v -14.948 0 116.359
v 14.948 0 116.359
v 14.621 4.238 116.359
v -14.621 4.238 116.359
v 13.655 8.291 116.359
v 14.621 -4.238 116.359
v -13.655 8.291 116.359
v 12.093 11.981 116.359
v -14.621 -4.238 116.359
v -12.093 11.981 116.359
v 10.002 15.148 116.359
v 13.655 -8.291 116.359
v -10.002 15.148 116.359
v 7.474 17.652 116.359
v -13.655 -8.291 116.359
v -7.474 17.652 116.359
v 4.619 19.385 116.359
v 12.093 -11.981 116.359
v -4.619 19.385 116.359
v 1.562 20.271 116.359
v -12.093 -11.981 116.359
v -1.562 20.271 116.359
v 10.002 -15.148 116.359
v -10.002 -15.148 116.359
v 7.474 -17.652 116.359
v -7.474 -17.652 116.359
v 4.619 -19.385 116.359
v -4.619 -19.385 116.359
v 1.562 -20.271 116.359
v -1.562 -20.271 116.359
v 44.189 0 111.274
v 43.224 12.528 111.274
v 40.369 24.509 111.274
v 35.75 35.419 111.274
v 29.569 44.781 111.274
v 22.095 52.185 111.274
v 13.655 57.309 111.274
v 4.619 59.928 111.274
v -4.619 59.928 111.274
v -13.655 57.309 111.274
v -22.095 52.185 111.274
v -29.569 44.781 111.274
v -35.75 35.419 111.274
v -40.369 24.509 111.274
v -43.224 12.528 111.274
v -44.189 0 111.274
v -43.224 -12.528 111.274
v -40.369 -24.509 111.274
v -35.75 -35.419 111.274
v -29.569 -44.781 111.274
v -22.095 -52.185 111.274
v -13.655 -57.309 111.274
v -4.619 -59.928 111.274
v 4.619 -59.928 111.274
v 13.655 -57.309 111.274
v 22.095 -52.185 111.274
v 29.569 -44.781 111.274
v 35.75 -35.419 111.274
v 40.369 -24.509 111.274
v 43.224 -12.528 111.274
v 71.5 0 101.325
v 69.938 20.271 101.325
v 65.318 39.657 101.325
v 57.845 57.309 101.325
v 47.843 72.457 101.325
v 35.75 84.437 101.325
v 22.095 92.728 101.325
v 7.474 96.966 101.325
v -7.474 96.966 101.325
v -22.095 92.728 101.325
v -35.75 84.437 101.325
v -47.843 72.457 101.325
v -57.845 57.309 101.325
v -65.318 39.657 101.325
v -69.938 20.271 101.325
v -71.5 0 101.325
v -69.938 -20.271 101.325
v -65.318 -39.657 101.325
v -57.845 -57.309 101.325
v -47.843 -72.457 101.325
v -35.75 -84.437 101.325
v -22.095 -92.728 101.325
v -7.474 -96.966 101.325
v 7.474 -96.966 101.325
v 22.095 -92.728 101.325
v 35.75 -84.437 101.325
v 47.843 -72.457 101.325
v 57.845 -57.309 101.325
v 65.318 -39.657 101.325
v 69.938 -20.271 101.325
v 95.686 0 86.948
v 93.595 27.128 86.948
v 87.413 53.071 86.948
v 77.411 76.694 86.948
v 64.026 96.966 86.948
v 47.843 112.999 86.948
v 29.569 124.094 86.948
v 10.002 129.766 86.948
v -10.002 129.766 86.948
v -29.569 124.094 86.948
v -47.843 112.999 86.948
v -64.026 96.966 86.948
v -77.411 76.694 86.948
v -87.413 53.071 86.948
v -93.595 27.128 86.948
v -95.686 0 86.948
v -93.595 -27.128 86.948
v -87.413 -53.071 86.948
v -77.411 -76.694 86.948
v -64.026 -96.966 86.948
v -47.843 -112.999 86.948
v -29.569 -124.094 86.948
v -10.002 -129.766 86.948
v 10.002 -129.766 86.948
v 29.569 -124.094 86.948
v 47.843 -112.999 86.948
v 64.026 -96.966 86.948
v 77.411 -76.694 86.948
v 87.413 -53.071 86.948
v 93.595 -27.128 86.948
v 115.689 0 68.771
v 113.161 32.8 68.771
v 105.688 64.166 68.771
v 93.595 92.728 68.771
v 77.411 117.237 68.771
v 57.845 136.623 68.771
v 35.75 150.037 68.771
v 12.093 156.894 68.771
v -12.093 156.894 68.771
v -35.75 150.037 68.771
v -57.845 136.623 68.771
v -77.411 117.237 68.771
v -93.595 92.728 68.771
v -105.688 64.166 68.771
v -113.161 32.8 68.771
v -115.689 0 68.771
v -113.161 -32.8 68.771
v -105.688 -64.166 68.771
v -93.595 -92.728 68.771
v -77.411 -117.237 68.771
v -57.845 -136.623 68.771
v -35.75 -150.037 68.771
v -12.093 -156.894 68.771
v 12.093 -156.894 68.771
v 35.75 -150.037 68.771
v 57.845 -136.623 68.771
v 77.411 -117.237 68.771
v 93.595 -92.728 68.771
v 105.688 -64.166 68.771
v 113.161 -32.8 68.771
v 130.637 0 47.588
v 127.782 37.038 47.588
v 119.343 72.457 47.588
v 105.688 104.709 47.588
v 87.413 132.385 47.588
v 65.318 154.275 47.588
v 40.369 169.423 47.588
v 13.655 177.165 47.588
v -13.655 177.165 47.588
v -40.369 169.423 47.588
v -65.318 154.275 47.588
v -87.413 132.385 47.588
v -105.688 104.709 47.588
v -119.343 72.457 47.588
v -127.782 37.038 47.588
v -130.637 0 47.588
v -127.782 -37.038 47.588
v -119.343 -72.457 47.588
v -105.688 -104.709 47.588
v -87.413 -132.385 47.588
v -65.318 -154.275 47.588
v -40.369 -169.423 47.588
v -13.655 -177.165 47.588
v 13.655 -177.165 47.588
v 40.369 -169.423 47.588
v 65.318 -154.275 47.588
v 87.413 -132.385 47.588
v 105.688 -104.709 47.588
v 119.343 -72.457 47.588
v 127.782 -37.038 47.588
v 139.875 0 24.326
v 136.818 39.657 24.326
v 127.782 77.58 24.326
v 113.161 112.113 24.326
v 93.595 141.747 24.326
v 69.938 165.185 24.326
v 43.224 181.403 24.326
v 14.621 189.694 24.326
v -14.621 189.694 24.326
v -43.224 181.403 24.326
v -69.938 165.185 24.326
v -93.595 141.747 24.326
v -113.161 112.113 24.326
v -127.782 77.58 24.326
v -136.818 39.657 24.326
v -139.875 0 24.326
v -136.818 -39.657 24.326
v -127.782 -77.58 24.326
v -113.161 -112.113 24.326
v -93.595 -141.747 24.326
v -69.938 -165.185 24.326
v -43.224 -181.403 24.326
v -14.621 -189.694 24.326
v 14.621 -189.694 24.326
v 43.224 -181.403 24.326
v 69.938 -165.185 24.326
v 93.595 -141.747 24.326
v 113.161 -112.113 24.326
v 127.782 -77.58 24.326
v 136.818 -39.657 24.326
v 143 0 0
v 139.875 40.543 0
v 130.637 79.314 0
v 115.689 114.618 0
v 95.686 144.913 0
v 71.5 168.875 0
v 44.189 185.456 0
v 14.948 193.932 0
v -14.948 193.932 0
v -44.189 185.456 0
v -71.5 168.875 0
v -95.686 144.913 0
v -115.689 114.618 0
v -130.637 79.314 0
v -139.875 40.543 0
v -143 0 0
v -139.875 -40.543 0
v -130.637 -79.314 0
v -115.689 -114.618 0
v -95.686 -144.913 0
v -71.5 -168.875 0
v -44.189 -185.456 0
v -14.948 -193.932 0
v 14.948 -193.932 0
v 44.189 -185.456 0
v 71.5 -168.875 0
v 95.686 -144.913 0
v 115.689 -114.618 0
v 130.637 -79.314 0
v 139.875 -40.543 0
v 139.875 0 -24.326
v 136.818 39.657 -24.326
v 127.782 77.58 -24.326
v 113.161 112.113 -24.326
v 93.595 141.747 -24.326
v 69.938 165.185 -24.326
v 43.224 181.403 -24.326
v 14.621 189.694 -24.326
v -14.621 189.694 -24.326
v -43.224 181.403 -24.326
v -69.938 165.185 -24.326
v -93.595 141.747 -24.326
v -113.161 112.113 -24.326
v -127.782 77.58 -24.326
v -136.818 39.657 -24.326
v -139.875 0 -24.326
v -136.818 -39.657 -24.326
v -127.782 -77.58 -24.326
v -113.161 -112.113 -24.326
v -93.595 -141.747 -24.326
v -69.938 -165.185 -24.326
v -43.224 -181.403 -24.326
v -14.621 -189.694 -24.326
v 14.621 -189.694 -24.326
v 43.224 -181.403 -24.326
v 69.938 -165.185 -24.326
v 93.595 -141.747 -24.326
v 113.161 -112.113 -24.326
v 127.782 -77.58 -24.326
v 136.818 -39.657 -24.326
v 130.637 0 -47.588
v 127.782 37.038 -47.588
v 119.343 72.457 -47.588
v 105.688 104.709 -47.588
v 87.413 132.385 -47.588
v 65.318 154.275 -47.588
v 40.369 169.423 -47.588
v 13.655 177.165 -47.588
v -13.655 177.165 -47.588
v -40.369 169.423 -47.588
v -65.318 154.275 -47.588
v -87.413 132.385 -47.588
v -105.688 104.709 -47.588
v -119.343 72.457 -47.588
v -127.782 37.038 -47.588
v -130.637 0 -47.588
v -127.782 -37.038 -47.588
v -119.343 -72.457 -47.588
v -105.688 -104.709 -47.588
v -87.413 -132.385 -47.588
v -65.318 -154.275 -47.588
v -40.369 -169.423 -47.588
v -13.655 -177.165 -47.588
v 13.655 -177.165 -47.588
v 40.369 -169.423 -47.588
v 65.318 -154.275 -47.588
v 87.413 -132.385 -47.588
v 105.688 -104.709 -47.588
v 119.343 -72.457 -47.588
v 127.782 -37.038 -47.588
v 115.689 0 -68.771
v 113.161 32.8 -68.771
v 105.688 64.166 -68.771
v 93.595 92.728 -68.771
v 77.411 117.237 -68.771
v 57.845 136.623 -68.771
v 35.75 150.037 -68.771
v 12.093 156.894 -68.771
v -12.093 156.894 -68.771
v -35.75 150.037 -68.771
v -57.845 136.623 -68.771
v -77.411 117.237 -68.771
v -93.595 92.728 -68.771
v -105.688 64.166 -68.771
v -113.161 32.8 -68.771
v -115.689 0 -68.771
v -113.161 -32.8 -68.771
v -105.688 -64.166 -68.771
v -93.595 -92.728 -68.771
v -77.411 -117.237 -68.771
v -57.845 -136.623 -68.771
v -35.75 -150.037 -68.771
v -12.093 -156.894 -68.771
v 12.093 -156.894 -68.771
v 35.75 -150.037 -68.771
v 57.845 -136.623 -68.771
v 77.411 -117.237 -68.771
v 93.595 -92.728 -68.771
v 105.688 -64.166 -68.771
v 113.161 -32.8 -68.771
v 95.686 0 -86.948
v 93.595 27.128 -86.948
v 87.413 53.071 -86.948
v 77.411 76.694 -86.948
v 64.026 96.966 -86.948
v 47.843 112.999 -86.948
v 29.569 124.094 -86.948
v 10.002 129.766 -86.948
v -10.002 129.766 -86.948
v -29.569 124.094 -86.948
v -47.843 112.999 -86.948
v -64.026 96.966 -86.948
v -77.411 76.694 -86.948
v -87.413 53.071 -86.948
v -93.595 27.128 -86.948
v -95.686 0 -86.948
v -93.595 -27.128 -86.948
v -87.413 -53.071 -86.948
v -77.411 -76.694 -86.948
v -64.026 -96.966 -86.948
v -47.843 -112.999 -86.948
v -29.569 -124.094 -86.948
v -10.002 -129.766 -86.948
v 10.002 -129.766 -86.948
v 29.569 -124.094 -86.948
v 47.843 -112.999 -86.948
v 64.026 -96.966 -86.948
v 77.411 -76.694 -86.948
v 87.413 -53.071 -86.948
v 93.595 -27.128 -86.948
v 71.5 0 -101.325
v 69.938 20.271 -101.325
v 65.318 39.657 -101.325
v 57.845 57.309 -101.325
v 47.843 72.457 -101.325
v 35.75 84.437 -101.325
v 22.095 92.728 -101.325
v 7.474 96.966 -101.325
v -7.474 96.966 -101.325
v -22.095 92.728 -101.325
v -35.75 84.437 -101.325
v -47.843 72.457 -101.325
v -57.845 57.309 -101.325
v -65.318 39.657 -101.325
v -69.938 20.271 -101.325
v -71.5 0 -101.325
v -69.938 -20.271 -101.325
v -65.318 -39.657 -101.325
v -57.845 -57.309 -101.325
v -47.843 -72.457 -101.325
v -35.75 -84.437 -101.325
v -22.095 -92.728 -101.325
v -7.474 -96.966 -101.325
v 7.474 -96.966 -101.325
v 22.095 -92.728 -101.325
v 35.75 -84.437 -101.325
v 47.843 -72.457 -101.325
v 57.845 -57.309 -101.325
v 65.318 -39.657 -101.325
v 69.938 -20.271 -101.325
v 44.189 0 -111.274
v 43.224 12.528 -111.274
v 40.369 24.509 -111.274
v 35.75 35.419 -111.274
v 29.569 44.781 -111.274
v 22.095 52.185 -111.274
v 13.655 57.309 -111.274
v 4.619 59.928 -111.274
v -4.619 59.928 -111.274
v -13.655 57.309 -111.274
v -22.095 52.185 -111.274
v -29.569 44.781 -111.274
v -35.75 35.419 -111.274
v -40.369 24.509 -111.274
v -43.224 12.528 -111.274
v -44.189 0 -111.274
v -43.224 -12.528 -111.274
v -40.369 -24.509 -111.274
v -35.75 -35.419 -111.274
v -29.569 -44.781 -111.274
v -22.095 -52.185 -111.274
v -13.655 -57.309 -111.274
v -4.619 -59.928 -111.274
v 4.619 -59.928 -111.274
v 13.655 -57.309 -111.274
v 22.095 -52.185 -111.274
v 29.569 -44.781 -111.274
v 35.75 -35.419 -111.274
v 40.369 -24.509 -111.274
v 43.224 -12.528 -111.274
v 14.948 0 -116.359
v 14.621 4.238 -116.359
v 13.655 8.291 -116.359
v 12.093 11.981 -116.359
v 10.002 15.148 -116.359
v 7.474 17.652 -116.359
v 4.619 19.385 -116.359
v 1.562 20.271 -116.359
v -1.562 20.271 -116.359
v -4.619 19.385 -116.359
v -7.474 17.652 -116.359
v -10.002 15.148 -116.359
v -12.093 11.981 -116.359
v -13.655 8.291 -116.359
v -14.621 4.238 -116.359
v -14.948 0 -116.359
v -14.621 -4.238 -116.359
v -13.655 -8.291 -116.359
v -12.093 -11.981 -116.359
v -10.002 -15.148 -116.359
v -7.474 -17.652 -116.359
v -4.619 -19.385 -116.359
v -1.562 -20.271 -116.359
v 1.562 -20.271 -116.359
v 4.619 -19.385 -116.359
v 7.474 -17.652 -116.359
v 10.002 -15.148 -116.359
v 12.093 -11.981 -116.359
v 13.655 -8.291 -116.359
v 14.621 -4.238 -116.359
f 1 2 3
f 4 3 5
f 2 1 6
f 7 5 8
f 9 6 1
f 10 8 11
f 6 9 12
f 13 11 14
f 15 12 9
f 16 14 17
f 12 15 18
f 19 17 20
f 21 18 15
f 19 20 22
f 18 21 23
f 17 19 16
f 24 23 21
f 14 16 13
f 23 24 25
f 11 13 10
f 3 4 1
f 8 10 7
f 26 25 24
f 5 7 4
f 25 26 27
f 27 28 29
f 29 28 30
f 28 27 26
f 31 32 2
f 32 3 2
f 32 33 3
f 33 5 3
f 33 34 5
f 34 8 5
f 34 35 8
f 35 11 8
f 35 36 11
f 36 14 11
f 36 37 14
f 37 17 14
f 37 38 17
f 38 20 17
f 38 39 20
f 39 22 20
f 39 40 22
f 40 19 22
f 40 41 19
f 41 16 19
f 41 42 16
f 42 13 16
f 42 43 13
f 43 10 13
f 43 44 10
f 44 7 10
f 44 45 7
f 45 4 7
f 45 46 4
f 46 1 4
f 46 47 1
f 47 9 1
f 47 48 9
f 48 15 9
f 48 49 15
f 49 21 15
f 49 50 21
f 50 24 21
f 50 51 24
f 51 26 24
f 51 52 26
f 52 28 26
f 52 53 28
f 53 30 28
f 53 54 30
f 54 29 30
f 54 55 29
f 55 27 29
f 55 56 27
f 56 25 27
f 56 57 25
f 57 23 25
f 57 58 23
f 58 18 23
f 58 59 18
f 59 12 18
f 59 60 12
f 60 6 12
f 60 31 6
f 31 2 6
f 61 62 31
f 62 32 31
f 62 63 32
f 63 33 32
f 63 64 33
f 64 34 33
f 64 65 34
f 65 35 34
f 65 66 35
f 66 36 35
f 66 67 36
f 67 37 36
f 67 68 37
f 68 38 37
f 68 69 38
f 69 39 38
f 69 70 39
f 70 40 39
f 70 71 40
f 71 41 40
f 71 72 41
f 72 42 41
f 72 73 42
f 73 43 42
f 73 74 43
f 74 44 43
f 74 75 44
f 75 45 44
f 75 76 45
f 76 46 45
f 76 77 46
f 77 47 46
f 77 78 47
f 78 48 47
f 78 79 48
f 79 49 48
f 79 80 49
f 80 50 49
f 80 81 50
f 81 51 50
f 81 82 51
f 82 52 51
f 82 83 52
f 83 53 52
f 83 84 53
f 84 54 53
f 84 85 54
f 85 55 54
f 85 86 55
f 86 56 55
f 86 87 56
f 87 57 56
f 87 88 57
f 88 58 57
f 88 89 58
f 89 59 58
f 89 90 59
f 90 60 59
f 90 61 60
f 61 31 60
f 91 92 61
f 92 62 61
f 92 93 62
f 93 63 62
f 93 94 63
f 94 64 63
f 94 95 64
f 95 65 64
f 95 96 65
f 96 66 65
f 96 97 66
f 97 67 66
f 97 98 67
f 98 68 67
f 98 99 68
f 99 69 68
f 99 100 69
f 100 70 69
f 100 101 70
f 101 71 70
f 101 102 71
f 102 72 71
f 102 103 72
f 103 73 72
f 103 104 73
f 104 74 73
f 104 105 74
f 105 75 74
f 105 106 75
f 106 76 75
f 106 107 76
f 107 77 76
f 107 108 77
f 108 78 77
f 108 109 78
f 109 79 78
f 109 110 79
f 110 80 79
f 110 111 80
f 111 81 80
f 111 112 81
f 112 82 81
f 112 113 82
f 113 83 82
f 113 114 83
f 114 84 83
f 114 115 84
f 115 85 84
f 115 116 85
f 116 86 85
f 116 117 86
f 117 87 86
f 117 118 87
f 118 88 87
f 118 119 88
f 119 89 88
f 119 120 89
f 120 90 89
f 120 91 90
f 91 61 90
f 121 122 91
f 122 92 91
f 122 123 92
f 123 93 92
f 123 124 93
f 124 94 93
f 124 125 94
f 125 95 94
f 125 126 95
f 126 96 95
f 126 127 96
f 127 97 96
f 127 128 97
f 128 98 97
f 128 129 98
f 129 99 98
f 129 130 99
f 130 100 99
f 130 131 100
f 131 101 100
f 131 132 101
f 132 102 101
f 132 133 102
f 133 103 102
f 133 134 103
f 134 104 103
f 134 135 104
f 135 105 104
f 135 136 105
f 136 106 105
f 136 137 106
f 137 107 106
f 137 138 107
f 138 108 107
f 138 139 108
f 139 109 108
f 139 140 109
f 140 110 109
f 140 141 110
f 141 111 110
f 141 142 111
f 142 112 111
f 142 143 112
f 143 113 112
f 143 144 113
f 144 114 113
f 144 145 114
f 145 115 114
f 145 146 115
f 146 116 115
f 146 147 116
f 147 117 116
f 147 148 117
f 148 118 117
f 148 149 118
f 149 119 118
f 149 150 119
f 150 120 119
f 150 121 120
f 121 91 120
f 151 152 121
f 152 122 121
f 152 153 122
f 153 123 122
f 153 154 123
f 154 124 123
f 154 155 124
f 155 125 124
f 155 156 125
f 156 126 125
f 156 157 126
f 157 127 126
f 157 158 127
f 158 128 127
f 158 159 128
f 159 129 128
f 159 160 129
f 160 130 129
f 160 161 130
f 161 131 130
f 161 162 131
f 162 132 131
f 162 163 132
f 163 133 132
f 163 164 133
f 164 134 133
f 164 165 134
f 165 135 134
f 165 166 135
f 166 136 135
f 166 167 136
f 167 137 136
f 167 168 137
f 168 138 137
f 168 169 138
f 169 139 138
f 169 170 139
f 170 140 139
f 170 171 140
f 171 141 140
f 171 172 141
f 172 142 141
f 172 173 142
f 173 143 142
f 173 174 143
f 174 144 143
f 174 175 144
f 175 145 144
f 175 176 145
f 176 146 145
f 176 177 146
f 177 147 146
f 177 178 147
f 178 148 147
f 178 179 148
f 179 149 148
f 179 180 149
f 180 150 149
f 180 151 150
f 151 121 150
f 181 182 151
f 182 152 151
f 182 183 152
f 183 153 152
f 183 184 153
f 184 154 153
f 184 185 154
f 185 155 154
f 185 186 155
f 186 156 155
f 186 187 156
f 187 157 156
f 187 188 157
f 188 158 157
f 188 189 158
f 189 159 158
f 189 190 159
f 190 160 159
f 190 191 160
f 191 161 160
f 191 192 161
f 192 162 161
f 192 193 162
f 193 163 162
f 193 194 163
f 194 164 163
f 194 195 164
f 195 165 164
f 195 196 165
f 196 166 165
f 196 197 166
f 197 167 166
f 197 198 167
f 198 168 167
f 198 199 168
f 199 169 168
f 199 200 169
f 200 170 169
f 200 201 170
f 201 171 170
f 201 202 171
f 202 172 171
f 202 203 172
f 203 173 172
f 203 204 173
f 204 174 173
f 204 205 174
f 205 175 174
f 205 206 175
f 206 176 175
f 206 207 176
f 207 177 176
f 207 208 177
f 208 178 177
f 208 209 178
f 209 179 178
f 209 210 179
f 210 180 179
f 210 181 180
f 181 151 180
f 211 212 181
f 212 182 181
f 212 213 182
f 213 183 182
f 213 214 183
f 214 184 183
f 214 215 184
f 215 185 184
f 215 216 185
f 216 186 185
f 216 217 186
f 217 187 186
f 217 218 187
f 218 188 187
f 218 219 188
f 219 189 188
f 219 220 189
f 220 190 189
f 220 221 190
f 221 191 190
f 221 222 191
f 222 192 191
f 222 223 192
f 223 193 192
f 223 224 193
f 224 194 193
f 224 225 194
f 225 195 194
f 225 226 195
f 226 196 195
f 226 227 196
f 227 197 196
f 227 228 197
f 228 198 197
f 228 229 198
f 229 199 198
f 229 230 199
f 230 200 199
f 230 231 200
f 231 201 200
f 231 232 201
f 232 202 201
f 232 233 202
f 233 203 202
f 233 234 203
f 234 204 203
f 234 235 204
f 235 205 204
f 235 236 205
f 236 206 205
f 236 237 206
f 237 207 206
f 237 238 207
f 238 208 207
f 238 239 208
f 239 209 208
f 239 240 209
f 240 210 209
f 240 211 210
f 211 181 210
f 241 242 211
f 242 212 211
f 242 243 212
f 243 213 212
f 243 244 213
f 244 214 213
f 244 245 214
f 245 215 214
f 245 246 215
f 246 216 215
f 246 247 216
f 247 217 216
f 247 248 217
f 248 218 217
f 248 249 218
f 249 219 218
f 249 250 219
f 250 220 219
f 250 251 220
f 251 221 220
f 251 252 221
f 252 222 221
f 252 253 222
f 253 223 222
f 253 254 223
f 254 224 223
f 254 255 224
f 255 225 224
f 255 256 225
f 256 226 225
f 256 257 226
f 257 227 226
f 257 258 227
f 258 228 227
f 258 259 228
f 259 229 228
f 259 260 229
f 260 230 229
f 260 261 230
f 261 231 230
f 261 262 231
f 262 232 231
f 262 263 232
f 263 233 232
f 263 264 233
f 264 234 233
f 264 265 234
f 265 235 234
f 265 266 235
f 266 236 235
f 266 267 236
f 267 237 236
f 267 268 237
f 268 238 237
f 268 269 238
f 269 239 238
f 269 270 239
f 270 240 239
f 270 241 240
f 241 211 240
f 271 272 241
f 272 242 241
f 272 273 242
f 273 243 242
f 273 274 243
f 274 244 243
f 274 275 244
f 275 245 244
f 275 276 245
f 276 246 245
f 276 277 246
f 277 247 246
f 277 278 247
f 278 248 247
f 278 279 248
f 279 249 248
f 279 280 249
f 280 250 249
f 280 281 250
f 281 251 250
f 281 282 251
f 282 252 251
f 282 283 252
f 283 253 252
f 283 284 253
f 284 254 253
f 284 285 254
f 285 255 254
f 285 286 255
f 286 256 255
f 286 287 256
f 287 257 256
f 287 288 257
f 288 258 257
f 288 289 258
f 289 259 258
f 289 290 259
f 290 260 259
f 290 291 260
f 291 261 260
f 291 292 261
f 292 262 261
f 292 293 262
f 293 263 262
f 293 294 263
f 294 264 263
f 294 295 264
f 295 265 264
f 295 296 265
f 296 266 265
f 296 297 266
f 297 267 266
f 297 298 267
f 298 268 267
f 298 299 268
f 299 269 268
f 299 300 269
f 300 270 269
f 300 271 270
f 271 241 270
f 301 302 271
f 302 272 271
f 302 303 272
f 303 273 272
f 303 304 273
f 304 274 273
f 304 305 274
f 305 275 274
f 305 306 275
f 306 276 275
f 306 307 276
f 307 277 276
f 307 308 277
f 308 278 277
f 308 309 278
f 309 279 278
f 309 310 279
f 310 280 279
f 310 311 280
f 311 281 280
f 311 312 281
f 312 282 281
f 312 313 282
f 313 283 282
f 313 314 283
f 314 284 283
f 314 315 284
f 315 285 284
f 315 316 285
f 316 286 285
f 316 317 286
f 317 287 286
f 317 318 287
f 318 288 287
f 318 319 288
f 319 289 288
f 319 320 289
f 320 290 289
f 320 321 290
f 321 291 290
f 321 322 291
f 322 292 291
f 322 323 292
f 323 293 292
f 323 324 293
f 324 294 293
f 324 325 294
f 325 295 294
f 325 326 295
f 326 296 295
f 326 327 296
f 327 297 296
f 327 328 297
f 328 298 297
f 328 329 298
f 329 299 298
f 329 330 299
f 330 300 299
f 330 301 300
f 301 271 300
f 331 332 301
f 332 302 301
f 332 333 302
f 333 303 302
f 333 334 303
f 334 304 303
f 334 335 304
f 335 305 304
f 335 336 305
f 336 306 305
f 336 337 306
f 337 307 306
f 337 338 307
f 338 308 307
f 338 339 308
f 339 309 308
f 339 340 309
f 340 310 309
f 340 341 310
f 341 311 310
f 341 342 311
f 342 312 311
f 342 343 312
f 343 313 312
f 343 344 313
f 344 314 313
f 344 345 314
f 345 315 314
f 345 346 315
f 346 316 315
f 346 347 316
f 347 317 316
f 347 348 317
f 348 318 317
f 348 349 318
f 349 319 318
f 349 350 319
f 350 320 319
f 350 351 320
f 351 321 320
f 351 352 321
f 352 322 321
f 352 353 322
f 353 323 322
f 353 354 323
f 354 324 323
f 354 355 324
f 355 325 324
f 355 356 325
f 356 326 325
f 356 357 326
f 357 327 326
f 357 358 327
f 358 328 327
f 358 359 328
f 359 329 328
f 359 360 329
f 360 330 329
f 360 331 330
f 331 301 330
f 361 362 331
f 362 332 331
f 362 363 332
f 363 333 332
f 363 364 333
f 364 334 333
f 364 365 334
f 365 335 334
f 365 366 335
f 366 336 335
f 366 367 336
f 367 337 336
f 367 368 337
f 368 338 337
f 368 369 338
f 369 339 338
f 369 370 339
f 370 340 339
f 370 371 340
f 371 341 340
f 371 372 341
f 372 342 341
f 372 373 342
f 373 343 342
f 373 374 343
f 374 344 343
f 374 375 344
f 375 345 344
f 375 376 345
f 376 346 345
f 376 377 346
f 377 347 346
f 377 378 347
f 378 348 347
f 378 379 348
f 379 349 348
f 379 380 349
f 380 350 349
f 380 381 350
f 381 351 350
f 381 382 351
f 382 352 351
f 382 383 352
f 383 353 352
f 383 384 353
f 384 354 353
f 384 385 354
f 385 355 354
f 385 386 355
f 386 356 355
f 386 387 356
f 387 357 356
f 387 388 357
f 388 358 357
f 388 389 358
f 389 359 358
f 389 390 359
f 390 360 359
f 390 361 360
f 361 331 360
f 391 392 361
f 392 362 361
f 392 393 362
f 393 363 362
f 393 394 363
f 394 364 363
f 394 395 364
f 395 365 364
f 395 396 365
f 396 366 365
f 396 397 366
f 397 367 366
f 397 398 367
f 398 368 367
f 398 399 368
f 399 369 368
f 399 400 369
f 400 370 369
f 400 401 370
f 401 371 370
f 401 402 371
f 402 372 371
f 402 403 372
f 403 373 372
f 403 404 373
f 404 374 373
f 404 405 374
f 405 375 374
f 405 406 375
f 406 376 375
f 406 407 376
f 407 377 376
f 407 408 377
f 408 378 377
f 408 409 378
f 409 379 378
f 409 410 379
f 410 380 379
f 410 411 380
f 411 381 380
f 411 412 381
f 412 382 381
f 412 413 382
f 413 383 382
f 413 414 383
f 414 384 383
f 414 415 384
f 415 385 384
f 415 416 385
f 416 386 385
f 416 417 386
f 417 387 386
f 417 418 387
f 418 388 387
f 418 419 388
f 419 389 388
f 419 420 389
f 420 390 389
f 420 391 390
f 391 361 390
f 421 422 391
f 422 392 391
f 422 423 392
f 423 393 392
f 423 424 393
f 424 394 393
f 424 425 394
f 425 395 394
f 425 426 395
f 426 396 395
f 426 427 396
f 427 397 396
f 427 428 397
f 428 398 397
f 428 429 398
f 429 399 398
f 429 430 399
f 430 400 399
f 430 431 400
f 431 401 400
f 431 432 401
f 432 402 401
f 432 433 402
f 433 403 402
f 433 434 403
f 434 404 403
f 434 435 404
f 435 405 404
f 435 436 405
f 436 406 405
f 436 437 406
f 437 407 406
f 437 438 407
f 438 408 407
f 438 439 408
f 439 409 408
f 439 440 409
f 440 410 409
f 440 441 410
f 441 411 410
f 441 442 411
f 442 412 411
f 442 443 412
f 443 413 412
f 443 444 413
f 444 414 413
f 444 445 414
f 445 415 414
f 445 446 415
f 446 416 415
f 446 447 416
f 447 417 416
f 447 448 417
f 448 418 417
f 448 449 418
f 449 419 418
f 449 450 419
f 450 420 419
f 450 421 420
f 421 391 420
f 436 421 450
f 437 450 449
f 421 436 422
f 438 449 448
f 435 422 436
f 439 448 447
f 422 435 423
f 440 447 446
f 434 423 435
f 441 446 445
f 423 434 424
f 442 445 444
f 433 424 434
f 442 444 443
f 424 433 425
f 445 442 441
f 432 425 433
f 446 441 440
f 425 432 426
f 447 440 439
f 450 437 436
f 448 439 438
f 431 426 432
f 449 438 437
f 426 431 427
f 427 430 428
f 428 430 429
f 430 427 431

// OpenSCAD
// Generated by SolidPython 1.0.1 on 2020-07-29 00:46:50


scale(v = [11, 15, 9]) {
	sphere(r = 13);
}
/***********************************************
*********      SolidPython code:      **********
************************************************
 
# import packages: SolidPython
from solid import *
from solid.utils import *
from itertools import chain, combinations, permutations


class Resize:

    def __init__(self, scad_file):
        self.scad_file = scad_file
        #self.scad_file = import_scad(scad_file)
        # cone/cylinder param:
        self.r1 = 0
        self.r2 = 0
        self.h = 0
        # rectangular prism param:
        self.w = 0
        self.l = 0
        # ellipse param:
        self.r = 0

    # import OpenScad code (file name corresponds to shape)


    # classify shape + parameters
    def assign(self, param1, param2, param3):
        if self.scad_file == 'cone.scad':
            self.r1 = param1
            self.r2 = param2
            self.h = param3
        elif self.scad_file == 'cylinder.scad':
            self.r1 = param1
            self.r2 = param2
            self.h = param3
        elif self.scad_file == 'rectangularPrism.scad':
            self.h = param1
            self.l = param2
            self.w = param3
        else:
            self.r = param1
            self.h = param2

    # resize parameters
    def iterate(self):
        x = range(3, 20, 2)
        i = 1
        if self.scad_file == 'cone.scad':
            tempList = list(permutations(x, 2))
            for temp in tempList:
                param1 = temp[0]
                param2 = temp[1]
                filepath = 'produced_scad_files/' + 'cone' + str(param1) + '_' + str(param2) + '_' + '.scad'
                scad_render_to_file(cylinder(h=param1, r1=param2, r2=0), filepath)

        elif self.scad_file == 'cylinder.scad':
            tempList = list(permutations(x, 3))
            for temp in tempList:
                param1 = temp[0]
                param2 = temp[1]
                filepath = 'produced_scad_files/' + 'cylinder' + str(param1) + '_' + str(param2) + '_' + '.scad'
                scad_render_to_file(cylinder(h=param1, r1=param2, r2=param2), filepath)

        elif self.scad_file == 'rectangularPrism.scad':
            tempList = list(permutations(x, 3))
            for temp in tempList:
                param1 = temp[0]
                param2 = temp[1]
                param3 = temp[2]
                filepath = 'produced_scad_files/' + 'rectangularPrism' + str(param1) + '_' + str(param2) + '_' + str(
                    param3) + '.scad'
                scad_render_to_file(cube(size=(param1, param2, param3)), filepath)

        elif self.scad_file == 'ellipse.scad':
            tempList = list(permutations(x, 4))
            for temp in tempList:
                param1 = temp[0]
                param2 = temp[1]
                param3 = temp[2]
                param4 = temp[3]
                filepath = 'produced_scad_files/' + 'ellipse' + str(param1) + '_' + str(param2) + '_' + str(param3) + '_' + str(param4) + '.scad'
                scad_render_to_file(scale([param1, param2, param3])(sphere(r=param4)), filepath)

    def render_to_scadfile(self):
        scad_render_to_file(scad, 'example.scad') 
 
************************************************/
